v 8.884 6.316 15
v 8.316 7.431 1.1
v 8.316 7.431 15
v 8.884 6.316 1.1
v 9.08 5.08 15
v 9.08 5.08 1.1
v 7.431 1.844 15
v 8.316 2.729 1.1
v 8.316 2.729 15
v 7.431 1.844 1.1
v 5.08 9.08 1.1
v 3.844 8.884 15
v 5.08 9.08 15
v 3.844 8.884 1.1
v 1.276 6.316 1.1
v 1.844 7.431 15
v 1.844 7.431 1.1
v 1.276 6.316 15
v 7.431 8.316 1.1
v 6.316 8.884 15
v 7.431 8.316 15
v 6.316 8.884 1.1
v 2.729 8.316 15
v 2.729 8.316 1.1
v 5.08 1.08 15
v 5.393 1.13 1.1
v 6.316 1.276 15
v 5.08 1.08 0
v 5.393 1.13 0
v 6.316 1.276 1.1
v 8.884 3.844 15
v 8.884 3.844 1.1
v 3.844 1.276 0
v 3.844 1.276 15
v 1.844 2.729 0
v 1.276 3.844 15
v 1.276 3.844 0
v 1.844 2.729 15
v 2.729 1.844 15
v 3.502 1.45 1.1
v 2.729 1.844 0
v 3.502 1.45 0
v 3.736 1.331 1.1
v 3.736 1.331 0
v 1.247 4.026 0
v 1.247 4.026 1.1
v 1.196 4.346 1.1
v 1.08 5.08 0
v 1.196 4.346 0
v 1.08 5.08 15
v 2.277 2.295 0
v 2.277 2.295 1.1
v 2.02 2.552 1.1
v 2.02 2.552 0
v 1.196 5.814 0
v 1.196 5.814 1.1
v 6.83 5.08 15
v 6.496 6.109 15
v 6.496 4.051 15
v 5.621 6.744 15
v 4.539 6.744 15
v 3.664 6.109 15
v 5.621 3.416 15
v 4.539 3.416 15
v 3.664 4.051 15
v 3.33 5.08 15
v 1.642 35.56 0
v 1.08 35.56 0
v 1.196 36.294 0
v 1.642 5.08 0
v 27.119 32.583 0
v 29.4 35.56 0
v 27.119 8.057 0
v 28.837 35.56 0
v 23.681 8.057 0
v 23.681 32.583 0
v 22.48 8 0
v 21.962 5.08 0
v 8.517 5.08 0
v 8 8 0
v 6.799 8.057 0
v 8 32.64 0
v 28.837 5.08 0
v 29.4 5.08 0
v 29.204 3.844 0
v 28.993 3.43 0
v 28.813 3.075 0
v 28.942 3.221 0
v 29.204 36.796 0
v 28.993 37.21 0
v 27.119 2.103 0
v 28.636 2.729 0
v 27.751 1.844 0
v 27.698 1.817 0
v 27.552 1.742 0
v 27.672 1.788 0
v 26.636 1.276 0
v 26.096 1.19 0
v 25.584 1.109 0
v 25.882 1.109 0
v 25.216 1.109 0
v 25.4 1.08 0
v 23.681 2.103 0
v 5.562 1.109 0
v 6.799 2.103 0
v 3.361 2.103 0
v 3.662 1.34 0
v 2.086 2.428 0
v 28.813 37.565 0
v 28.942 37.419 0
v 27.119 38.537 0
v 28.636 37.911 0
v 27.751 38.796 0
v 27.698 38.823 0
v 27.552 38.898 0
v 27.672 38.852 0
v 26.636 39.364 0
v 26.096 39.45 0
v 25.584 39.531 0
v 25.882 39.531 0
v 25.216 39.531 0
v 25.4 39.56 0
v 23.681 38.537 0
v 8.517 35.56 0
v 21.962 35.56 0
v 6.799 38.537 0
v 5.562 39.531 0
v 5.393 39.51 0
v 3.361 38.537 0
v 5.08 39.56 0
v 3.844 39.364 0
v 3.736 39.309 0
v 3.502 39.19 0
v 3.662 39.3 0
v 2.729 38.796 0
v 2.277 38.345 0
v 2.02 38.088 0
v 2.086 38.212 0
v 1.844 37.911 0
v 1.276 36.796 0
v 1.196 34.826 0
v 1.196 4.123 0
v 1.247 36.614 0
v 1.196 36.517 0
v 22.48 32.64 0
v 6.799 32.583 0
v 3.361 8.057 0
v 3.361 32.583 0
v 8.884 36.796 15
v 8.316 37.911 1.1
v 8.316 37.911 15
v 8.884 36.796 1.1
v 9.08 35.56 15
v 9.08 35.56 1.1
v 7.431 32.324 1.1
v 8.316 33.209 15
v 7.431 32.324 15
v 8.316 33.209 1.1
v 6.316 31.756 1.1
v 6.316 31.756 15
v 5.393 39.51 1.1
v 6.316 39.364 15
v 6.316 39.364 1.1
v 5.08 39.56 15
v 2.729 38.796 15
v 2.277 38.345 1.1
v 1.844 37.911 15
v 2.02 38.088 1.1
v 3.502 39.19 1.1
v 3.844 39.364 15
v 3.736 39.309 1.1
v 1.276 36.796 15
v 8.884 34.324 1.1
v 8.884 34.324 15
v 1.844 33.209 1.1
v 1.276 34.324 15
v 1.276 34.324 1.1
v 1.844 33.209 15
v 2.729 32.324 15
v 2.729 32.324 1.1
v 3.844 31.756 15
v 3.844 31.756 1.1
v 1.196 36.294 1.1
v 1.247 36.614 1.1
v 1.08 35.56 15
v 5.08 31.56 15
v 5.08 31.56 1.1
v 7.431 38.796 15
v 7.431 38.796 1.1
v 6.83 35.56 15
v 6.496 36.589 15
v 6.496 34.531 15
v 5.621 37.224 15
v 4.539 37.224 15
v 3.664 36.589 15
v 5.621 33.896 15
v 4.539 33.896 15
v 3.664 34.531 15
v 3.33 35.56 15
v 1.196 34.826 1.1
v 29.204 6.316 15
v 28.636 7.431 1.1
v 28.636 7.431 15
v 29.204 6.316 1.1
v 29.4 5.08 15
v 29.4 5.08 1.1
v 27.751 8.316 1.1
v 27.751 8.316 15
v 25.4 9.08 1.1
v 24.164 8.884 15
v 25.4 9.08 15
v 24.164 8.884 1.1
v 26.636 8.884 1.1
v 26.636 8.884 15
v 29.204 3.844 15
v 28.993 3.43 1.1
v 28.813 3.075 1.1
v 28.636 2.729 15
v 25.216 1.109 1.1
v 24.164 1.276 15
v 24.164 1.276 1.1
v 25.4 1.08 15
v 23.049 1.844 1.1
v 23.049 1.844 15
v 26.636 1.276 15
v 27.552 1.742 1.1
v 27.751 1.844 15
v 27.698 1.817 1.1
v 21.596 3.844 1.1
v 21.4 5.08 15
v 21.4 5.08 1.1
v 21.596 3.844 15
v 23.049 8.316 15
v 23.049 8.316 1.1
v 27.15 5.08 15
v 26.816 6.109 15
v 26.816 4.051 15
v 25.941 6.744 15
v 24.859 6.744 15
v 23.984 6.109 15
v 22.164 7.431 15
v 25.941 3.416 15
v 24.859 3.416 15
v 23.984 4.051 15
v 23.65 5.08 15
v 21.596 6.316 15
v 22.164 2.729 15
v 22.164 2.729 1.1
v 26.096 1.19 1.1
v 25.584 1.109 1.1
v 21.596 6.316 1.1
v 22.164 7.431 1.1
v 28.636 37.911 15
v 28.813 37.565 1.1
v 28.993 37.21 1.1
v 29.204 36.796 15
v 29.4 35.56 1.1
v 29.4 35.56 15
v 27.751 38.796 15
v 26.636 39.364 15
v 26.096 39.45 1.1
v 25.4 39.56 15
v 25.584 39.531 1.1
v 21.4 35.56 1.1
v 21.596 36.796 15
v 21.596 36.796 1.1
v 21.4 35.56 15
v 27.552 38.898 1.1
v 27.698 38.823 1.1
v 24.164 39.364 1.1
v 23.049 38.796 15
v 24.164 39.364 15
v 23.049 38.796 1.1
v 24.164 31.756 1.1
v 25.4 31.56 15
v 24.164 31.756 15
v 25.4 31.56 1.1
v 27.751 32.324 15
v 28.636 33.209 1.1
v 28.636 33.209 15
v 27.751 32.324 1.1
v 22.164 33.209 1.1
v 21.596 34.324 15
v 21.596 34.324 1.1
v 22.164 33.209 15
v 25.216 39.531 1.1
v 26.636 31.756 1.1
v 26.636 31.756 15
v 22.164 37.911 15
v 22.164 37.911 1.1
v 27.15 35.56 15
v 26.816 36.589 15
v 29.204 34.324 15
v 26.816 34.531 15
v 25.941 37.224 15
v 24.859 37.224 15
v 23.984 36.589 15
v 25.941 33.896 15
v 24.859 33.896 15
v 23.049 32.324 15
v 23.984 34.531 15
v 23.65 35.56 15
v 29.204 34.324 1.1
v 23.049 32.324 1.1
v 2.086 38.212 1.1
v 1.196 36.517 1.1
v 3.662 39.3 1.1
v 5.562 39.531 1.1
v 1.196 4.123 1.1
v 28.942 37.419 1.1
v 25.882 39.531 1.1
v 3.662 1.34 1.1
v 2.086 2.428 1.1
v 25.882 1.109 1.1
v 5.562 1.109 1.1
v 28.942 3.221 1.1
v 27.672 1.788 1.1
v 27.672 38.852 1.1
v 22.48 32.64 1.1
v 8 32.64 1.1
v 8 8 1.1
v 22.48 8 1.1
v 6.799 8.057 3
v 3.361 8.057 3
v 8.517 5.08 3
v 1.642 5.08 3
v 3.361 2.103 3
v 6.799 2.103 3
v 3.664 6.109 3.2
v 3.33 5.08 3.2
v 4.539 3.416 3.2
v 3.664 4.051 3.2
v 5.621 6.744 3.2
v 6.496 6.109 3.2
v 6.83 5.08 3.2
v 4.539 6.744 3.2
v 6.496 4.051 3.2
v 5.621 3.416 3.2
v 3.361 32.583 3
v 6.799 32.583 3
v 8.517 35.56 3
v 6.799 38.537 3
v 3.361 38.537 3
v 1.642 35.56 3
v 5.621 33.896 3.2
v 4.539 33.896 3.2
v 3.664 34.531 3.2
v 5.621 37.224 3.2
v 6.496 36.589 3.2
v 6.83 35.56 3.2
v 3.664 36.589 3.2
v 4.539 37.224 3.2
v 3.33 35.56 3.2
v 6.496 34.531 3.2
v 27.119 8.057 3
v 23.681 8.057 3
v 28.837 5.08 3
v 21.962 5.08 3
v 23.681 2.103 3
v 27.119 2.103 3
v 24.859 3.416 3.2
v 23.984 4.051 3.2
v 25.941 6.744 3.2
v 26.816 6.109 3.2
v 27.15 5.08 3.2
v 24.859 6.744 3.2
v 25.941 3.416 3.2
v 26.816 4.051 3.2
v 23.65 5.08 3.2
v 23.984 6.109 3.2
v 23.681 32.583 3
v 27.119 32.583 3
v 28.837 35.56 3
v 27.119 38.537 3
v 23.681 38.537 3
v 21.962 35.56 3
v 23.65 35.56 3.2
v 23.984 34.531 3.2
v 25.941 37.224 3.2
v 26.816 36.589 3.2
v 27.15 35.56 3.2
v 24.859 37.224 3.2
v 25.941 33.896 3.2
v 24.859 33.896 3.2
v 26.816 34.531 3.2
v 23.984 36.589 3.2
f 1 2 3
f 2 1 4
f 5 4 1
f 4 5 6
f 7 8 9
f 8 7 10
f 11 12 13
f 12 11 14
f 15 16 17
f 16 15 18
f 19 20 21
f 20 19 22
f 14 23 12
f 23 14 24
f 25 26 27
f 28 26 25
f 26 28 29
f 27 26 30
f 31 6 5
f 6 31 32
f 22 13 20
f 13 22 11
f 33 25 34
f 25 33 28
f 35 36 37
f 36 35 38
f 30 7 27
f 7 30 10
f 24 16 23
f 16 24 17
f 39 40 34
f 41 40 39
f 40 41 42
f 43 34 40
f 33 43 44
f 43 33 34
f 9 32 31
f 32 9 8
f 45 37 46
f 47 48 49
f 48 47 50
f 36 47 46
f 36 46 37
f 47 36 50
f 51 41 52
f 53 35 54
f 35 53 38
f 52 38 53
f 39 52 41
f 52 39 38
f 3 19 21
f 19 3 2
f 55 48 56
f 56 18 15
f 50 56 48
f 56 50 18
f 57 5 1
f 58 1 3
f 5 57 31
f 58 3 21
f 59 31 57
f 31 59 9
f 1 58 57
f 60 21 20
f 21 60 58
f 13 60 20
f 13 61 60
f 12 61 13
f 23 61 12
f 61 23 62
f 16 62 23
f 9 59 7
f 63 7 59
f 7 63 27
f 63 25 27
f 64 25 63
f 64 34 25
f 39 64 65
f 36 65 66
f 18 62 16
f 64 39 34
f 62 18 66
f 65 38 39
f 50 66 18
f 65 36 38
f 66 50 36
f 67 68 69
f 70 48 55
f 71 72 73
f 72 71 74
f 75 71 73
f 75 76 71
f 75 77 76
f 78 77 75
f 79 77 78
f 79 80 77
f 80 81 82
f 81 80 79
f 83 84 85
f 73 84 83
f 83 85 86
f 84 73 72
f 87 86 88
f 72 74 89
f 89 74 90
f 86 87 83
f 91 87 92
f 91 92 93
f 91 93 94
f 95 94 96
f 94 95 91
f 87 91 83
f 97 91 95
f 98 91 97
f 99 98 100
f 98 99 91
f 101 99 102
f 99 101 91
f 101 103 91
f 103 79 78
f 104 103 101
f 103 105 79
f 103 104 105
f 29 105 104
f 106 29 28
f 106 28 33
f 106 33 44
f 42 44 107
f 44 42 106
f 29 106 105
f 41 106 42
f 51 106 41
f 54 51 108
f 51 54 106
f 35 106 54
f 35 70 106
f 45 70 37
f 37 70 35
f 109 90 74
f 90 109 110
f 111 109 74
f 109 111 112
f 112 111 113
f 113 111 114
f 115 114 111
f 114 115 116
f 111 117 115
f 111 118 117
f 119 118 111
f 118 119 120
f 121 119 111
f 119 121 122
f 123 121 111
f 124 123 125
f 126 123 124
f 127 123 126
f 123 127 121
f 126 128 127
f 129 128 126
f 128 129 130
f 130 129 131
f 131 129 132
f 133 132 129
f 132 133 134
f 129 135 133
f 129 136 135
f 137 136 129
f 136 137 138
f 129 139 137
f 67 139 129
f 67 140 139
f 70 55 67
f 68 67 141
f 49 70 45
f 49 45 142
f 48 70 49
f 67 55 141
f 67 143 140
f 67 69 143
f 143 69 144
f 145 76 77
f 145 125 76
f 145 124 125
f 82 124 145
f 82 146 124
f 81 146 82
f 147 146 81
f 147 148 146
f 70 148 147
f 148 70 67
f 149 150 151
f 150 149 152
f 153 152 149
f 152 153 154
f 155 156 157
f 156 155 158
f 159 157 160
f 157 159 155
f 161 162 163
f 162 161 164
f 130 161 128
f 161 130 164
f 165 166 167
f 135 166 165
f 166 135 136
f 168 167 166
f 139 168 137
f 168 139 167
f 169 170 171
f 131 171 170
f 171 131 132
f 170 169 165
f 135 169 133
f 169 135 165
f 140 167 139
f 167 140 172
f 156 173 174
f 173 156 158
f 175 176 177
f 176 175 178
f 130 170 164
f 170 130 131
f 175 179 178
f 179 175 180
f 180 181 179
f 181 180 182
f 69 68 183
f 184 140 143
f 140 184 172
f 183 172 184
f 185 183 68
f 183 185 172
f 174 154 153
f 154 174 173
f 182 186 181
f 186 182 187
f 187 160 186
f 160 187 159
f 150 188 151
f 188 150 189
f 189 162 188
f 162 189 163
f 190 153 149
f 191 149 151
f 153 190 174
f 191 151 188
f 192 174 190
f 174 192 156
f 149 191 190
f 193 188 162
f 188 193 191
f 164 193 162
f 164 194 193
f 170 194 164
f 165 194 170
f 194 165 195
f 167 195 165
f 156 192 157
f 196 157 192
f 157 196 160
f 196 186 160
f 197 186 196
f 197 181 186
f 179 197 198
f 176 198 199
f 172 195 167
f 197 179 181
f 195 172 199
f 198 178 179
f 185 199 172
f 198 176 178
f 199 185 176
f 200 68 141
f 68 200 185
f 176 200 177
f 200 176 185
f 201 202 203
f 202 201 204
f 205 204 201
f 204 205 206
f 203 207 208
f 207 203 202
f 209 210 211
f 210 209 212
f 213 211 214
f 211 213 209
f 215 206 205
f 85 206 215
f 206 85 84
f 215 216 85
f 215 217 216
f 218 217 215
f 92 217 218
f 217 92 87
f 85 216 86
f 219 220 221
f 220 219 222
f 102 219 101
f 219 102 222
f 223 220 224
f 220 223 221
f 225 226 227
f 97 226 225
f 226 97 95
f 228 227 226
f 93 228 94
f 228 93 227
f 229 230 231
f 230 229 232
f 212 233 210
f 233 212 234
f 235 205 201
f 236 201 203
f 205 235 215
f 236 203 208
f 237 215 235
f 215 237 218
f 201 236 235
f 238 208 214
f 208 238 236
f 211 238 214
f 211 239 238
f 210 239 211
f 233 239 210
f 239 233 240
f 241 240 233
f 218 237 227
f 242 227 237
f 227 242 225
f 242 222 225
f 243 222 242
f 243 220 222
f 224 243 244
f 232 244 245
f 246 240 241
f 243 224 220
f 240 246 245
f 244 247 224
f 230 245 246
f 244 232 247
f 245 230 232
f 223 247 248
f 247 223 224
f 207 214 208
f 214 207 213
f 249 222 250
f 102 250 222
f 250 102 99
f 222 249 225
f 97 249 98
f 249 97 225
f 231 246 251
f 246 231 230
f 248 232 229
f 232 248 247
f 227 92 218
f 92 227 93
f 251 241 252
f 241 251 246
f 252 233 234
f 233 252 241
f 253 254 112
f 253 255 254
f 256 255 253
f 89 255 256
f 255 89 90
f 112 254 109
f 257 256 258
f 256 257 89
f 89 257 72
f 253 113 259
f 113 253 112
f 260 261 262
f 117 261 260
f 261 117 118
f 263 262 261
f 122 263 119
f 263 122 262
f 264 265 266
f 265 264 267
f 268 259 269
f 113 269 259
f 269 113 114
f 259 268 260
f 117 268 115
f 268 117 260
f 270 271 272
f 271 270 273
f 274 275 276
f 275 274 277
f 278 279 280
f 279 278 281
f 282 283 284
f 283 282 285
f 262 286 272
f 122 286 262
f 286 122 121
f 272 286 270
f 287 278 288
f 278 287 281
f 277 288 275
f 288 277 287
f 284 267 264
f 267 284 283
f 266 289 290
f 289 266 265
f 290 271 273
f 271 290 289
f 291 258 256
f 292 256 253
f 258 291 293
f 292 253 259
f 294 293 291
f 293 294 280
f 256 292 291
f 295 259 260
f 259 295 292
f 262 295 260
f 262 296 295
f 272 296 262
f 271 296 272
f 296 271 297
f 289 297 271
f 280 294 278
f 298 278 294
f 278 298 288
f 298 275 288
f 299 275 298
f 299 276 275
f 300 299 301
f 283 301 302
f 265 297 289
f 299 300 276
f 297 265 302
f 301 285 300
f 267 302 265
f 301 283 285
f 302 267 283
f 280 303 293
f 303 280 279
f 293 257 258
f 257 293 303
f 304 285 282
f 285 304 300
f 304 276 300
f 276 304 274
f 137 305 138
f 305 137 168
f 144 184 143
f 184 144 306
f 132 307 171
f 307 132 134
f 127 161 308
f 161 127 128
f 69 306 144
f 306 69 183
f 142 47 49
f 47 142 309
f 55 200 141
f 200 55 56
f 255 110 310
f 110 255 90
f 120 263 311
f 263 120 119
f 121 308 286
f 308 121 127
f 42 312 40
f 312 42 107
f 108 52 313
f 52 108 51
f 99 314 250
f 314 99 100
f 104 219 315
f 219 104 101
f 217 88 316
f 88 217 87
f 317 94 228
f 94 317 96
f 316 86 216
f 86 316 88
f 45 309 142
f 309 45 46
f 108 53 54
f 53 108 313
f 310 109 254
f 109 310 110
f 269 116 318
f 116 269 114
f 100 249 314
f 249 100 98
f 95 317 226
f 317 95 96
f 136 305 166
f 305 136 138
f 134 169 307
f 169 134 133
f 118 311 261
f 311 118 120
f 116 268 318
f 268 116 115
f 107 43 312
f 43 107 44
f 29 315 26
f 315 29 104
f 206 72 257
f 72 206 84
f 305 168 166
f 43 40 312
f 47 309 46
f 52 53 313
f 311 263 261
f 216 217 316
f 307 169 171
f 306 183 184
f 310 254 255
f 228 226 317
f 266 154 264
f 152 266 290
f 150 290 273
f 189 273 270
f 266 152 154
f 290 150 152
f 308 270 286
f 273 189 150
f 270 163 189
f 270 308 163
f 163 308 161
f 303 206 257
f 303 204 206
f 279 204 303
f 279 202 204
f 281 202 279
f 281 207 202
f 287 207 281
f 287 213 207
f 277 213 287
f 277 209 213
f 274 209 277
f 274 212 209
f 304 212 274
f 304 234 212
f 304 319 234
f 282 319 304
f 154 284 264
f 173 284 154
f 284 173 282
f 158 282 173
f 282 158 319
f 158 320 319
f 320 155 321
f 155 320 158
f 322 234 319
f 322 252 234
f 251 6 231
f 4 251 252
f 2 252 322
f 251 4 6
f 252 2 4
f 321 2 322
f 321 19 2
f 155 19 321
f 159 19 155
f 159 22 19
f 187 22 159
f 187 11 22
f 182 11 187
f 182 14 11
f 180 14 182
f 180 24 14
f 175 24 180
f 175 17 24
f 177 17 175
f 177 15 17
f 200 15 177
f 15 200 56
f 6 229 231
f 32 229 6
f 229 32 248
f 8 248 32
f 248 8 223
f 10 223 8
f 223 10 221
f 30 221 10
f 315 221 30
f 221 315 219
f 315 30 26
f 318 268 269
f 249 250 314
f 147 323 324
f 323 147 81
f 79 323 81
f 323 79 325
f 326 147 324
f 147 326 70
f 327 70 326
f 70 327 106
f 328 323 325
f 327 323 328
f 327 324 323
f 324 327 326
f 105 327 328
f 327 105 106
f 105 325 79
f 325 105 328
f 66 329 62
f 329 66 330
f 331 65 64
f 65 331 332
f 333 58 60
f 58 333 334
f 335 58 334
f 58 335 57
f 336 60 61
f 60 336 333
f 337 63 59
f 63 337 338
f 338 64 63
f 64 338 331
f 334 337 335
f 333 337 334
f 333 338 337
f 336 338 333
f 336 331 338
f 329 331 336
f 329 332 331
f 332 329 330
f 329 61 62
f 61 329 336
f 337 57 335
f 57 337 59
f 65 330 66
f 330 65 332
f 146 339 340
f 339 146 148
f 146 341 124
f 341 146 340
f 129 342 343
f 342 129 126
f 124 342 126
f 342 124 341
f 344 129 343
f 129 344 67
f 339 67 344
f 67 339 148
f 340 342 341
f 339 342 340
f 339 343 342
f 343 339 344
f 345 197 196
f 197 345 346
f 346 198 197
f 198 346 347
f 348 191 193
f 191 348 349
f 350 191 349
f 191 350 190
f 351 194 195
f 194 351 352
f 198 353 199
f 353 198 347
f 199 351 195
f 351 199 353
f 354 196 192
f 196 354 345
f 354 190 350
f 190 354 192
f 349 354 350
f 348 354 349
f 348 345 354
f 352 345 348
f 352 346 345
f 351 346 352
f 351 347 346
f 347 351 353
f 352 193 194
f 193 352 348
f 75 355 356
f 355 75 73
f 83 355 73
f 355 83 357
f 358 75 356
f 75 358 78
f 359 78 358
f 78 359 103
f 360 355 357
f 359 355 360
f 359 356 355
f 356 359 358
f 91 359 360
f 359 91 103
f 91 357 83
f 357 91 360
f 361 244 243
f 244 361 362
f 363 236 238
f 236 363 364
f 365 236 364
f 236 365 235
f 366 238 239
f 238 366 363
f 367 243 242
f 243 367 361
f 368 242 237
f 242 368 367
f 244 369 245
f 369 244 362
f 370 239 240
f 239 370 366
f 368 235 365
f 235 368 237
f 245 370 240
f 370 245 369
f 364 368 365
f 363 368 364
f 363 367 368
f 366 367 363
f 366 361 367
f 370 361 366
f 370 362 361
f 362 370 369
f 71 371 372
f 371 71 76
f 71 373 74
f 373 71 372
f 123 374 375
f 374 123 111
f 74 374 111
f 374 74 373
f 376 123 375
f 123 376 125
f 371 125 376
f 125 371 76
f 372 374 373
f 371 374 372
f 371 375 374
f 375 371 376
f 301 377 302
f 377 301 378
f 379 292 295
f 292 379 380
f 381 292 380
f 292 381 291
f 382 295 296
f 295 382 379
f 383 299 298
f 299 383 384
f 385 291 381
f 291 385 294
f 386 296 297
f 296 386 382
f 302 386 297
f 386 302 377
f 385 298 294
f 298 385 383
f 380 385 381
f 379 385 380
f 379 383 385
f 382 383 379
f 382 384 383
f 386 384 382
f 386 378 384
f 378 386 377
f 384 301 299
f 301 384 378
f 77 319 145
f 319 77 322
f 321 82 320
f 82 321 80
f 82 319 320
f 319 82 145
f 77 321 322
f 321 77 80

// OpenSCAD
x_holes = 3;
y_holes = 4;
MLAB_grid = 10.16;
pile_radius = 4;
pedestal_height = 15;   // designed for use the MLAB standard 20mm screws.
x_size = x_holes * MLAB_grid ;
y_size = y_holes * MLAB_grid ;
mount_hole = 3.5;
//nut_size = 6.8;  //size suitable for PLA material
nut_size = 6.7;  //size suitable for ABS material
clear = 0.175;


thickness = 1;

MLAB_grid_xoffset = MLAB_grid/2;
MLAB_grid_yoffset = MLAB_grid/2;

grid_list = [for (j = [MLAB_grid_xoffset : MLAB_grid: x_size], i = [MLAB_grid_yoffset :MLAB_grid: y_size]) 
if ((j>(x_size-10) && i>(y_size-10)) || (j<10 && i<10) || (j<10 && i>(y_size-10)) || (j>(x_size-10) && i<10) ) [j, i] ];


difference () {
    union () {
        for (j = grid_list) {
            translate (concat(j, [0]))
            cylinder (h = pedestal_height, r= pile_radius, $fn=20);
        }

            translate ([MLAB_grid_xoffset , MLAB_grid_yoffset , 0])
                minkowski() {
                cube([x_size - 2*(MLAB_grid/2 - pile_radius) - 2*pile_radius, y_size - 2*(MLAB_grid/2 - pile_radius) - 2*pile_radius, thickness]);          // base plastics brick
                cylinder(r=pile_radius,h=0.1);
            }
    }
    
    translate ([2*pile_radius, 2*pile_radius, 0]) // central hole in module support
        cube([x_size-4*pile_radius, y_size-4*pile_radius, 2*thickness]);          

    // MLAB grid holes
    for (j = grid_list) {
            translate (concat(j, [0]))
            cylinder (h = 3, r= (nut_size+clear)/2, $fn=6);
            translate (concat(j, [3.2]))  // one solid layer for slicer (the holes will be pierced on demand )
            cylinder (h = pedestal_height, r= mount_hole/2, $fn=10);
        }    
}
